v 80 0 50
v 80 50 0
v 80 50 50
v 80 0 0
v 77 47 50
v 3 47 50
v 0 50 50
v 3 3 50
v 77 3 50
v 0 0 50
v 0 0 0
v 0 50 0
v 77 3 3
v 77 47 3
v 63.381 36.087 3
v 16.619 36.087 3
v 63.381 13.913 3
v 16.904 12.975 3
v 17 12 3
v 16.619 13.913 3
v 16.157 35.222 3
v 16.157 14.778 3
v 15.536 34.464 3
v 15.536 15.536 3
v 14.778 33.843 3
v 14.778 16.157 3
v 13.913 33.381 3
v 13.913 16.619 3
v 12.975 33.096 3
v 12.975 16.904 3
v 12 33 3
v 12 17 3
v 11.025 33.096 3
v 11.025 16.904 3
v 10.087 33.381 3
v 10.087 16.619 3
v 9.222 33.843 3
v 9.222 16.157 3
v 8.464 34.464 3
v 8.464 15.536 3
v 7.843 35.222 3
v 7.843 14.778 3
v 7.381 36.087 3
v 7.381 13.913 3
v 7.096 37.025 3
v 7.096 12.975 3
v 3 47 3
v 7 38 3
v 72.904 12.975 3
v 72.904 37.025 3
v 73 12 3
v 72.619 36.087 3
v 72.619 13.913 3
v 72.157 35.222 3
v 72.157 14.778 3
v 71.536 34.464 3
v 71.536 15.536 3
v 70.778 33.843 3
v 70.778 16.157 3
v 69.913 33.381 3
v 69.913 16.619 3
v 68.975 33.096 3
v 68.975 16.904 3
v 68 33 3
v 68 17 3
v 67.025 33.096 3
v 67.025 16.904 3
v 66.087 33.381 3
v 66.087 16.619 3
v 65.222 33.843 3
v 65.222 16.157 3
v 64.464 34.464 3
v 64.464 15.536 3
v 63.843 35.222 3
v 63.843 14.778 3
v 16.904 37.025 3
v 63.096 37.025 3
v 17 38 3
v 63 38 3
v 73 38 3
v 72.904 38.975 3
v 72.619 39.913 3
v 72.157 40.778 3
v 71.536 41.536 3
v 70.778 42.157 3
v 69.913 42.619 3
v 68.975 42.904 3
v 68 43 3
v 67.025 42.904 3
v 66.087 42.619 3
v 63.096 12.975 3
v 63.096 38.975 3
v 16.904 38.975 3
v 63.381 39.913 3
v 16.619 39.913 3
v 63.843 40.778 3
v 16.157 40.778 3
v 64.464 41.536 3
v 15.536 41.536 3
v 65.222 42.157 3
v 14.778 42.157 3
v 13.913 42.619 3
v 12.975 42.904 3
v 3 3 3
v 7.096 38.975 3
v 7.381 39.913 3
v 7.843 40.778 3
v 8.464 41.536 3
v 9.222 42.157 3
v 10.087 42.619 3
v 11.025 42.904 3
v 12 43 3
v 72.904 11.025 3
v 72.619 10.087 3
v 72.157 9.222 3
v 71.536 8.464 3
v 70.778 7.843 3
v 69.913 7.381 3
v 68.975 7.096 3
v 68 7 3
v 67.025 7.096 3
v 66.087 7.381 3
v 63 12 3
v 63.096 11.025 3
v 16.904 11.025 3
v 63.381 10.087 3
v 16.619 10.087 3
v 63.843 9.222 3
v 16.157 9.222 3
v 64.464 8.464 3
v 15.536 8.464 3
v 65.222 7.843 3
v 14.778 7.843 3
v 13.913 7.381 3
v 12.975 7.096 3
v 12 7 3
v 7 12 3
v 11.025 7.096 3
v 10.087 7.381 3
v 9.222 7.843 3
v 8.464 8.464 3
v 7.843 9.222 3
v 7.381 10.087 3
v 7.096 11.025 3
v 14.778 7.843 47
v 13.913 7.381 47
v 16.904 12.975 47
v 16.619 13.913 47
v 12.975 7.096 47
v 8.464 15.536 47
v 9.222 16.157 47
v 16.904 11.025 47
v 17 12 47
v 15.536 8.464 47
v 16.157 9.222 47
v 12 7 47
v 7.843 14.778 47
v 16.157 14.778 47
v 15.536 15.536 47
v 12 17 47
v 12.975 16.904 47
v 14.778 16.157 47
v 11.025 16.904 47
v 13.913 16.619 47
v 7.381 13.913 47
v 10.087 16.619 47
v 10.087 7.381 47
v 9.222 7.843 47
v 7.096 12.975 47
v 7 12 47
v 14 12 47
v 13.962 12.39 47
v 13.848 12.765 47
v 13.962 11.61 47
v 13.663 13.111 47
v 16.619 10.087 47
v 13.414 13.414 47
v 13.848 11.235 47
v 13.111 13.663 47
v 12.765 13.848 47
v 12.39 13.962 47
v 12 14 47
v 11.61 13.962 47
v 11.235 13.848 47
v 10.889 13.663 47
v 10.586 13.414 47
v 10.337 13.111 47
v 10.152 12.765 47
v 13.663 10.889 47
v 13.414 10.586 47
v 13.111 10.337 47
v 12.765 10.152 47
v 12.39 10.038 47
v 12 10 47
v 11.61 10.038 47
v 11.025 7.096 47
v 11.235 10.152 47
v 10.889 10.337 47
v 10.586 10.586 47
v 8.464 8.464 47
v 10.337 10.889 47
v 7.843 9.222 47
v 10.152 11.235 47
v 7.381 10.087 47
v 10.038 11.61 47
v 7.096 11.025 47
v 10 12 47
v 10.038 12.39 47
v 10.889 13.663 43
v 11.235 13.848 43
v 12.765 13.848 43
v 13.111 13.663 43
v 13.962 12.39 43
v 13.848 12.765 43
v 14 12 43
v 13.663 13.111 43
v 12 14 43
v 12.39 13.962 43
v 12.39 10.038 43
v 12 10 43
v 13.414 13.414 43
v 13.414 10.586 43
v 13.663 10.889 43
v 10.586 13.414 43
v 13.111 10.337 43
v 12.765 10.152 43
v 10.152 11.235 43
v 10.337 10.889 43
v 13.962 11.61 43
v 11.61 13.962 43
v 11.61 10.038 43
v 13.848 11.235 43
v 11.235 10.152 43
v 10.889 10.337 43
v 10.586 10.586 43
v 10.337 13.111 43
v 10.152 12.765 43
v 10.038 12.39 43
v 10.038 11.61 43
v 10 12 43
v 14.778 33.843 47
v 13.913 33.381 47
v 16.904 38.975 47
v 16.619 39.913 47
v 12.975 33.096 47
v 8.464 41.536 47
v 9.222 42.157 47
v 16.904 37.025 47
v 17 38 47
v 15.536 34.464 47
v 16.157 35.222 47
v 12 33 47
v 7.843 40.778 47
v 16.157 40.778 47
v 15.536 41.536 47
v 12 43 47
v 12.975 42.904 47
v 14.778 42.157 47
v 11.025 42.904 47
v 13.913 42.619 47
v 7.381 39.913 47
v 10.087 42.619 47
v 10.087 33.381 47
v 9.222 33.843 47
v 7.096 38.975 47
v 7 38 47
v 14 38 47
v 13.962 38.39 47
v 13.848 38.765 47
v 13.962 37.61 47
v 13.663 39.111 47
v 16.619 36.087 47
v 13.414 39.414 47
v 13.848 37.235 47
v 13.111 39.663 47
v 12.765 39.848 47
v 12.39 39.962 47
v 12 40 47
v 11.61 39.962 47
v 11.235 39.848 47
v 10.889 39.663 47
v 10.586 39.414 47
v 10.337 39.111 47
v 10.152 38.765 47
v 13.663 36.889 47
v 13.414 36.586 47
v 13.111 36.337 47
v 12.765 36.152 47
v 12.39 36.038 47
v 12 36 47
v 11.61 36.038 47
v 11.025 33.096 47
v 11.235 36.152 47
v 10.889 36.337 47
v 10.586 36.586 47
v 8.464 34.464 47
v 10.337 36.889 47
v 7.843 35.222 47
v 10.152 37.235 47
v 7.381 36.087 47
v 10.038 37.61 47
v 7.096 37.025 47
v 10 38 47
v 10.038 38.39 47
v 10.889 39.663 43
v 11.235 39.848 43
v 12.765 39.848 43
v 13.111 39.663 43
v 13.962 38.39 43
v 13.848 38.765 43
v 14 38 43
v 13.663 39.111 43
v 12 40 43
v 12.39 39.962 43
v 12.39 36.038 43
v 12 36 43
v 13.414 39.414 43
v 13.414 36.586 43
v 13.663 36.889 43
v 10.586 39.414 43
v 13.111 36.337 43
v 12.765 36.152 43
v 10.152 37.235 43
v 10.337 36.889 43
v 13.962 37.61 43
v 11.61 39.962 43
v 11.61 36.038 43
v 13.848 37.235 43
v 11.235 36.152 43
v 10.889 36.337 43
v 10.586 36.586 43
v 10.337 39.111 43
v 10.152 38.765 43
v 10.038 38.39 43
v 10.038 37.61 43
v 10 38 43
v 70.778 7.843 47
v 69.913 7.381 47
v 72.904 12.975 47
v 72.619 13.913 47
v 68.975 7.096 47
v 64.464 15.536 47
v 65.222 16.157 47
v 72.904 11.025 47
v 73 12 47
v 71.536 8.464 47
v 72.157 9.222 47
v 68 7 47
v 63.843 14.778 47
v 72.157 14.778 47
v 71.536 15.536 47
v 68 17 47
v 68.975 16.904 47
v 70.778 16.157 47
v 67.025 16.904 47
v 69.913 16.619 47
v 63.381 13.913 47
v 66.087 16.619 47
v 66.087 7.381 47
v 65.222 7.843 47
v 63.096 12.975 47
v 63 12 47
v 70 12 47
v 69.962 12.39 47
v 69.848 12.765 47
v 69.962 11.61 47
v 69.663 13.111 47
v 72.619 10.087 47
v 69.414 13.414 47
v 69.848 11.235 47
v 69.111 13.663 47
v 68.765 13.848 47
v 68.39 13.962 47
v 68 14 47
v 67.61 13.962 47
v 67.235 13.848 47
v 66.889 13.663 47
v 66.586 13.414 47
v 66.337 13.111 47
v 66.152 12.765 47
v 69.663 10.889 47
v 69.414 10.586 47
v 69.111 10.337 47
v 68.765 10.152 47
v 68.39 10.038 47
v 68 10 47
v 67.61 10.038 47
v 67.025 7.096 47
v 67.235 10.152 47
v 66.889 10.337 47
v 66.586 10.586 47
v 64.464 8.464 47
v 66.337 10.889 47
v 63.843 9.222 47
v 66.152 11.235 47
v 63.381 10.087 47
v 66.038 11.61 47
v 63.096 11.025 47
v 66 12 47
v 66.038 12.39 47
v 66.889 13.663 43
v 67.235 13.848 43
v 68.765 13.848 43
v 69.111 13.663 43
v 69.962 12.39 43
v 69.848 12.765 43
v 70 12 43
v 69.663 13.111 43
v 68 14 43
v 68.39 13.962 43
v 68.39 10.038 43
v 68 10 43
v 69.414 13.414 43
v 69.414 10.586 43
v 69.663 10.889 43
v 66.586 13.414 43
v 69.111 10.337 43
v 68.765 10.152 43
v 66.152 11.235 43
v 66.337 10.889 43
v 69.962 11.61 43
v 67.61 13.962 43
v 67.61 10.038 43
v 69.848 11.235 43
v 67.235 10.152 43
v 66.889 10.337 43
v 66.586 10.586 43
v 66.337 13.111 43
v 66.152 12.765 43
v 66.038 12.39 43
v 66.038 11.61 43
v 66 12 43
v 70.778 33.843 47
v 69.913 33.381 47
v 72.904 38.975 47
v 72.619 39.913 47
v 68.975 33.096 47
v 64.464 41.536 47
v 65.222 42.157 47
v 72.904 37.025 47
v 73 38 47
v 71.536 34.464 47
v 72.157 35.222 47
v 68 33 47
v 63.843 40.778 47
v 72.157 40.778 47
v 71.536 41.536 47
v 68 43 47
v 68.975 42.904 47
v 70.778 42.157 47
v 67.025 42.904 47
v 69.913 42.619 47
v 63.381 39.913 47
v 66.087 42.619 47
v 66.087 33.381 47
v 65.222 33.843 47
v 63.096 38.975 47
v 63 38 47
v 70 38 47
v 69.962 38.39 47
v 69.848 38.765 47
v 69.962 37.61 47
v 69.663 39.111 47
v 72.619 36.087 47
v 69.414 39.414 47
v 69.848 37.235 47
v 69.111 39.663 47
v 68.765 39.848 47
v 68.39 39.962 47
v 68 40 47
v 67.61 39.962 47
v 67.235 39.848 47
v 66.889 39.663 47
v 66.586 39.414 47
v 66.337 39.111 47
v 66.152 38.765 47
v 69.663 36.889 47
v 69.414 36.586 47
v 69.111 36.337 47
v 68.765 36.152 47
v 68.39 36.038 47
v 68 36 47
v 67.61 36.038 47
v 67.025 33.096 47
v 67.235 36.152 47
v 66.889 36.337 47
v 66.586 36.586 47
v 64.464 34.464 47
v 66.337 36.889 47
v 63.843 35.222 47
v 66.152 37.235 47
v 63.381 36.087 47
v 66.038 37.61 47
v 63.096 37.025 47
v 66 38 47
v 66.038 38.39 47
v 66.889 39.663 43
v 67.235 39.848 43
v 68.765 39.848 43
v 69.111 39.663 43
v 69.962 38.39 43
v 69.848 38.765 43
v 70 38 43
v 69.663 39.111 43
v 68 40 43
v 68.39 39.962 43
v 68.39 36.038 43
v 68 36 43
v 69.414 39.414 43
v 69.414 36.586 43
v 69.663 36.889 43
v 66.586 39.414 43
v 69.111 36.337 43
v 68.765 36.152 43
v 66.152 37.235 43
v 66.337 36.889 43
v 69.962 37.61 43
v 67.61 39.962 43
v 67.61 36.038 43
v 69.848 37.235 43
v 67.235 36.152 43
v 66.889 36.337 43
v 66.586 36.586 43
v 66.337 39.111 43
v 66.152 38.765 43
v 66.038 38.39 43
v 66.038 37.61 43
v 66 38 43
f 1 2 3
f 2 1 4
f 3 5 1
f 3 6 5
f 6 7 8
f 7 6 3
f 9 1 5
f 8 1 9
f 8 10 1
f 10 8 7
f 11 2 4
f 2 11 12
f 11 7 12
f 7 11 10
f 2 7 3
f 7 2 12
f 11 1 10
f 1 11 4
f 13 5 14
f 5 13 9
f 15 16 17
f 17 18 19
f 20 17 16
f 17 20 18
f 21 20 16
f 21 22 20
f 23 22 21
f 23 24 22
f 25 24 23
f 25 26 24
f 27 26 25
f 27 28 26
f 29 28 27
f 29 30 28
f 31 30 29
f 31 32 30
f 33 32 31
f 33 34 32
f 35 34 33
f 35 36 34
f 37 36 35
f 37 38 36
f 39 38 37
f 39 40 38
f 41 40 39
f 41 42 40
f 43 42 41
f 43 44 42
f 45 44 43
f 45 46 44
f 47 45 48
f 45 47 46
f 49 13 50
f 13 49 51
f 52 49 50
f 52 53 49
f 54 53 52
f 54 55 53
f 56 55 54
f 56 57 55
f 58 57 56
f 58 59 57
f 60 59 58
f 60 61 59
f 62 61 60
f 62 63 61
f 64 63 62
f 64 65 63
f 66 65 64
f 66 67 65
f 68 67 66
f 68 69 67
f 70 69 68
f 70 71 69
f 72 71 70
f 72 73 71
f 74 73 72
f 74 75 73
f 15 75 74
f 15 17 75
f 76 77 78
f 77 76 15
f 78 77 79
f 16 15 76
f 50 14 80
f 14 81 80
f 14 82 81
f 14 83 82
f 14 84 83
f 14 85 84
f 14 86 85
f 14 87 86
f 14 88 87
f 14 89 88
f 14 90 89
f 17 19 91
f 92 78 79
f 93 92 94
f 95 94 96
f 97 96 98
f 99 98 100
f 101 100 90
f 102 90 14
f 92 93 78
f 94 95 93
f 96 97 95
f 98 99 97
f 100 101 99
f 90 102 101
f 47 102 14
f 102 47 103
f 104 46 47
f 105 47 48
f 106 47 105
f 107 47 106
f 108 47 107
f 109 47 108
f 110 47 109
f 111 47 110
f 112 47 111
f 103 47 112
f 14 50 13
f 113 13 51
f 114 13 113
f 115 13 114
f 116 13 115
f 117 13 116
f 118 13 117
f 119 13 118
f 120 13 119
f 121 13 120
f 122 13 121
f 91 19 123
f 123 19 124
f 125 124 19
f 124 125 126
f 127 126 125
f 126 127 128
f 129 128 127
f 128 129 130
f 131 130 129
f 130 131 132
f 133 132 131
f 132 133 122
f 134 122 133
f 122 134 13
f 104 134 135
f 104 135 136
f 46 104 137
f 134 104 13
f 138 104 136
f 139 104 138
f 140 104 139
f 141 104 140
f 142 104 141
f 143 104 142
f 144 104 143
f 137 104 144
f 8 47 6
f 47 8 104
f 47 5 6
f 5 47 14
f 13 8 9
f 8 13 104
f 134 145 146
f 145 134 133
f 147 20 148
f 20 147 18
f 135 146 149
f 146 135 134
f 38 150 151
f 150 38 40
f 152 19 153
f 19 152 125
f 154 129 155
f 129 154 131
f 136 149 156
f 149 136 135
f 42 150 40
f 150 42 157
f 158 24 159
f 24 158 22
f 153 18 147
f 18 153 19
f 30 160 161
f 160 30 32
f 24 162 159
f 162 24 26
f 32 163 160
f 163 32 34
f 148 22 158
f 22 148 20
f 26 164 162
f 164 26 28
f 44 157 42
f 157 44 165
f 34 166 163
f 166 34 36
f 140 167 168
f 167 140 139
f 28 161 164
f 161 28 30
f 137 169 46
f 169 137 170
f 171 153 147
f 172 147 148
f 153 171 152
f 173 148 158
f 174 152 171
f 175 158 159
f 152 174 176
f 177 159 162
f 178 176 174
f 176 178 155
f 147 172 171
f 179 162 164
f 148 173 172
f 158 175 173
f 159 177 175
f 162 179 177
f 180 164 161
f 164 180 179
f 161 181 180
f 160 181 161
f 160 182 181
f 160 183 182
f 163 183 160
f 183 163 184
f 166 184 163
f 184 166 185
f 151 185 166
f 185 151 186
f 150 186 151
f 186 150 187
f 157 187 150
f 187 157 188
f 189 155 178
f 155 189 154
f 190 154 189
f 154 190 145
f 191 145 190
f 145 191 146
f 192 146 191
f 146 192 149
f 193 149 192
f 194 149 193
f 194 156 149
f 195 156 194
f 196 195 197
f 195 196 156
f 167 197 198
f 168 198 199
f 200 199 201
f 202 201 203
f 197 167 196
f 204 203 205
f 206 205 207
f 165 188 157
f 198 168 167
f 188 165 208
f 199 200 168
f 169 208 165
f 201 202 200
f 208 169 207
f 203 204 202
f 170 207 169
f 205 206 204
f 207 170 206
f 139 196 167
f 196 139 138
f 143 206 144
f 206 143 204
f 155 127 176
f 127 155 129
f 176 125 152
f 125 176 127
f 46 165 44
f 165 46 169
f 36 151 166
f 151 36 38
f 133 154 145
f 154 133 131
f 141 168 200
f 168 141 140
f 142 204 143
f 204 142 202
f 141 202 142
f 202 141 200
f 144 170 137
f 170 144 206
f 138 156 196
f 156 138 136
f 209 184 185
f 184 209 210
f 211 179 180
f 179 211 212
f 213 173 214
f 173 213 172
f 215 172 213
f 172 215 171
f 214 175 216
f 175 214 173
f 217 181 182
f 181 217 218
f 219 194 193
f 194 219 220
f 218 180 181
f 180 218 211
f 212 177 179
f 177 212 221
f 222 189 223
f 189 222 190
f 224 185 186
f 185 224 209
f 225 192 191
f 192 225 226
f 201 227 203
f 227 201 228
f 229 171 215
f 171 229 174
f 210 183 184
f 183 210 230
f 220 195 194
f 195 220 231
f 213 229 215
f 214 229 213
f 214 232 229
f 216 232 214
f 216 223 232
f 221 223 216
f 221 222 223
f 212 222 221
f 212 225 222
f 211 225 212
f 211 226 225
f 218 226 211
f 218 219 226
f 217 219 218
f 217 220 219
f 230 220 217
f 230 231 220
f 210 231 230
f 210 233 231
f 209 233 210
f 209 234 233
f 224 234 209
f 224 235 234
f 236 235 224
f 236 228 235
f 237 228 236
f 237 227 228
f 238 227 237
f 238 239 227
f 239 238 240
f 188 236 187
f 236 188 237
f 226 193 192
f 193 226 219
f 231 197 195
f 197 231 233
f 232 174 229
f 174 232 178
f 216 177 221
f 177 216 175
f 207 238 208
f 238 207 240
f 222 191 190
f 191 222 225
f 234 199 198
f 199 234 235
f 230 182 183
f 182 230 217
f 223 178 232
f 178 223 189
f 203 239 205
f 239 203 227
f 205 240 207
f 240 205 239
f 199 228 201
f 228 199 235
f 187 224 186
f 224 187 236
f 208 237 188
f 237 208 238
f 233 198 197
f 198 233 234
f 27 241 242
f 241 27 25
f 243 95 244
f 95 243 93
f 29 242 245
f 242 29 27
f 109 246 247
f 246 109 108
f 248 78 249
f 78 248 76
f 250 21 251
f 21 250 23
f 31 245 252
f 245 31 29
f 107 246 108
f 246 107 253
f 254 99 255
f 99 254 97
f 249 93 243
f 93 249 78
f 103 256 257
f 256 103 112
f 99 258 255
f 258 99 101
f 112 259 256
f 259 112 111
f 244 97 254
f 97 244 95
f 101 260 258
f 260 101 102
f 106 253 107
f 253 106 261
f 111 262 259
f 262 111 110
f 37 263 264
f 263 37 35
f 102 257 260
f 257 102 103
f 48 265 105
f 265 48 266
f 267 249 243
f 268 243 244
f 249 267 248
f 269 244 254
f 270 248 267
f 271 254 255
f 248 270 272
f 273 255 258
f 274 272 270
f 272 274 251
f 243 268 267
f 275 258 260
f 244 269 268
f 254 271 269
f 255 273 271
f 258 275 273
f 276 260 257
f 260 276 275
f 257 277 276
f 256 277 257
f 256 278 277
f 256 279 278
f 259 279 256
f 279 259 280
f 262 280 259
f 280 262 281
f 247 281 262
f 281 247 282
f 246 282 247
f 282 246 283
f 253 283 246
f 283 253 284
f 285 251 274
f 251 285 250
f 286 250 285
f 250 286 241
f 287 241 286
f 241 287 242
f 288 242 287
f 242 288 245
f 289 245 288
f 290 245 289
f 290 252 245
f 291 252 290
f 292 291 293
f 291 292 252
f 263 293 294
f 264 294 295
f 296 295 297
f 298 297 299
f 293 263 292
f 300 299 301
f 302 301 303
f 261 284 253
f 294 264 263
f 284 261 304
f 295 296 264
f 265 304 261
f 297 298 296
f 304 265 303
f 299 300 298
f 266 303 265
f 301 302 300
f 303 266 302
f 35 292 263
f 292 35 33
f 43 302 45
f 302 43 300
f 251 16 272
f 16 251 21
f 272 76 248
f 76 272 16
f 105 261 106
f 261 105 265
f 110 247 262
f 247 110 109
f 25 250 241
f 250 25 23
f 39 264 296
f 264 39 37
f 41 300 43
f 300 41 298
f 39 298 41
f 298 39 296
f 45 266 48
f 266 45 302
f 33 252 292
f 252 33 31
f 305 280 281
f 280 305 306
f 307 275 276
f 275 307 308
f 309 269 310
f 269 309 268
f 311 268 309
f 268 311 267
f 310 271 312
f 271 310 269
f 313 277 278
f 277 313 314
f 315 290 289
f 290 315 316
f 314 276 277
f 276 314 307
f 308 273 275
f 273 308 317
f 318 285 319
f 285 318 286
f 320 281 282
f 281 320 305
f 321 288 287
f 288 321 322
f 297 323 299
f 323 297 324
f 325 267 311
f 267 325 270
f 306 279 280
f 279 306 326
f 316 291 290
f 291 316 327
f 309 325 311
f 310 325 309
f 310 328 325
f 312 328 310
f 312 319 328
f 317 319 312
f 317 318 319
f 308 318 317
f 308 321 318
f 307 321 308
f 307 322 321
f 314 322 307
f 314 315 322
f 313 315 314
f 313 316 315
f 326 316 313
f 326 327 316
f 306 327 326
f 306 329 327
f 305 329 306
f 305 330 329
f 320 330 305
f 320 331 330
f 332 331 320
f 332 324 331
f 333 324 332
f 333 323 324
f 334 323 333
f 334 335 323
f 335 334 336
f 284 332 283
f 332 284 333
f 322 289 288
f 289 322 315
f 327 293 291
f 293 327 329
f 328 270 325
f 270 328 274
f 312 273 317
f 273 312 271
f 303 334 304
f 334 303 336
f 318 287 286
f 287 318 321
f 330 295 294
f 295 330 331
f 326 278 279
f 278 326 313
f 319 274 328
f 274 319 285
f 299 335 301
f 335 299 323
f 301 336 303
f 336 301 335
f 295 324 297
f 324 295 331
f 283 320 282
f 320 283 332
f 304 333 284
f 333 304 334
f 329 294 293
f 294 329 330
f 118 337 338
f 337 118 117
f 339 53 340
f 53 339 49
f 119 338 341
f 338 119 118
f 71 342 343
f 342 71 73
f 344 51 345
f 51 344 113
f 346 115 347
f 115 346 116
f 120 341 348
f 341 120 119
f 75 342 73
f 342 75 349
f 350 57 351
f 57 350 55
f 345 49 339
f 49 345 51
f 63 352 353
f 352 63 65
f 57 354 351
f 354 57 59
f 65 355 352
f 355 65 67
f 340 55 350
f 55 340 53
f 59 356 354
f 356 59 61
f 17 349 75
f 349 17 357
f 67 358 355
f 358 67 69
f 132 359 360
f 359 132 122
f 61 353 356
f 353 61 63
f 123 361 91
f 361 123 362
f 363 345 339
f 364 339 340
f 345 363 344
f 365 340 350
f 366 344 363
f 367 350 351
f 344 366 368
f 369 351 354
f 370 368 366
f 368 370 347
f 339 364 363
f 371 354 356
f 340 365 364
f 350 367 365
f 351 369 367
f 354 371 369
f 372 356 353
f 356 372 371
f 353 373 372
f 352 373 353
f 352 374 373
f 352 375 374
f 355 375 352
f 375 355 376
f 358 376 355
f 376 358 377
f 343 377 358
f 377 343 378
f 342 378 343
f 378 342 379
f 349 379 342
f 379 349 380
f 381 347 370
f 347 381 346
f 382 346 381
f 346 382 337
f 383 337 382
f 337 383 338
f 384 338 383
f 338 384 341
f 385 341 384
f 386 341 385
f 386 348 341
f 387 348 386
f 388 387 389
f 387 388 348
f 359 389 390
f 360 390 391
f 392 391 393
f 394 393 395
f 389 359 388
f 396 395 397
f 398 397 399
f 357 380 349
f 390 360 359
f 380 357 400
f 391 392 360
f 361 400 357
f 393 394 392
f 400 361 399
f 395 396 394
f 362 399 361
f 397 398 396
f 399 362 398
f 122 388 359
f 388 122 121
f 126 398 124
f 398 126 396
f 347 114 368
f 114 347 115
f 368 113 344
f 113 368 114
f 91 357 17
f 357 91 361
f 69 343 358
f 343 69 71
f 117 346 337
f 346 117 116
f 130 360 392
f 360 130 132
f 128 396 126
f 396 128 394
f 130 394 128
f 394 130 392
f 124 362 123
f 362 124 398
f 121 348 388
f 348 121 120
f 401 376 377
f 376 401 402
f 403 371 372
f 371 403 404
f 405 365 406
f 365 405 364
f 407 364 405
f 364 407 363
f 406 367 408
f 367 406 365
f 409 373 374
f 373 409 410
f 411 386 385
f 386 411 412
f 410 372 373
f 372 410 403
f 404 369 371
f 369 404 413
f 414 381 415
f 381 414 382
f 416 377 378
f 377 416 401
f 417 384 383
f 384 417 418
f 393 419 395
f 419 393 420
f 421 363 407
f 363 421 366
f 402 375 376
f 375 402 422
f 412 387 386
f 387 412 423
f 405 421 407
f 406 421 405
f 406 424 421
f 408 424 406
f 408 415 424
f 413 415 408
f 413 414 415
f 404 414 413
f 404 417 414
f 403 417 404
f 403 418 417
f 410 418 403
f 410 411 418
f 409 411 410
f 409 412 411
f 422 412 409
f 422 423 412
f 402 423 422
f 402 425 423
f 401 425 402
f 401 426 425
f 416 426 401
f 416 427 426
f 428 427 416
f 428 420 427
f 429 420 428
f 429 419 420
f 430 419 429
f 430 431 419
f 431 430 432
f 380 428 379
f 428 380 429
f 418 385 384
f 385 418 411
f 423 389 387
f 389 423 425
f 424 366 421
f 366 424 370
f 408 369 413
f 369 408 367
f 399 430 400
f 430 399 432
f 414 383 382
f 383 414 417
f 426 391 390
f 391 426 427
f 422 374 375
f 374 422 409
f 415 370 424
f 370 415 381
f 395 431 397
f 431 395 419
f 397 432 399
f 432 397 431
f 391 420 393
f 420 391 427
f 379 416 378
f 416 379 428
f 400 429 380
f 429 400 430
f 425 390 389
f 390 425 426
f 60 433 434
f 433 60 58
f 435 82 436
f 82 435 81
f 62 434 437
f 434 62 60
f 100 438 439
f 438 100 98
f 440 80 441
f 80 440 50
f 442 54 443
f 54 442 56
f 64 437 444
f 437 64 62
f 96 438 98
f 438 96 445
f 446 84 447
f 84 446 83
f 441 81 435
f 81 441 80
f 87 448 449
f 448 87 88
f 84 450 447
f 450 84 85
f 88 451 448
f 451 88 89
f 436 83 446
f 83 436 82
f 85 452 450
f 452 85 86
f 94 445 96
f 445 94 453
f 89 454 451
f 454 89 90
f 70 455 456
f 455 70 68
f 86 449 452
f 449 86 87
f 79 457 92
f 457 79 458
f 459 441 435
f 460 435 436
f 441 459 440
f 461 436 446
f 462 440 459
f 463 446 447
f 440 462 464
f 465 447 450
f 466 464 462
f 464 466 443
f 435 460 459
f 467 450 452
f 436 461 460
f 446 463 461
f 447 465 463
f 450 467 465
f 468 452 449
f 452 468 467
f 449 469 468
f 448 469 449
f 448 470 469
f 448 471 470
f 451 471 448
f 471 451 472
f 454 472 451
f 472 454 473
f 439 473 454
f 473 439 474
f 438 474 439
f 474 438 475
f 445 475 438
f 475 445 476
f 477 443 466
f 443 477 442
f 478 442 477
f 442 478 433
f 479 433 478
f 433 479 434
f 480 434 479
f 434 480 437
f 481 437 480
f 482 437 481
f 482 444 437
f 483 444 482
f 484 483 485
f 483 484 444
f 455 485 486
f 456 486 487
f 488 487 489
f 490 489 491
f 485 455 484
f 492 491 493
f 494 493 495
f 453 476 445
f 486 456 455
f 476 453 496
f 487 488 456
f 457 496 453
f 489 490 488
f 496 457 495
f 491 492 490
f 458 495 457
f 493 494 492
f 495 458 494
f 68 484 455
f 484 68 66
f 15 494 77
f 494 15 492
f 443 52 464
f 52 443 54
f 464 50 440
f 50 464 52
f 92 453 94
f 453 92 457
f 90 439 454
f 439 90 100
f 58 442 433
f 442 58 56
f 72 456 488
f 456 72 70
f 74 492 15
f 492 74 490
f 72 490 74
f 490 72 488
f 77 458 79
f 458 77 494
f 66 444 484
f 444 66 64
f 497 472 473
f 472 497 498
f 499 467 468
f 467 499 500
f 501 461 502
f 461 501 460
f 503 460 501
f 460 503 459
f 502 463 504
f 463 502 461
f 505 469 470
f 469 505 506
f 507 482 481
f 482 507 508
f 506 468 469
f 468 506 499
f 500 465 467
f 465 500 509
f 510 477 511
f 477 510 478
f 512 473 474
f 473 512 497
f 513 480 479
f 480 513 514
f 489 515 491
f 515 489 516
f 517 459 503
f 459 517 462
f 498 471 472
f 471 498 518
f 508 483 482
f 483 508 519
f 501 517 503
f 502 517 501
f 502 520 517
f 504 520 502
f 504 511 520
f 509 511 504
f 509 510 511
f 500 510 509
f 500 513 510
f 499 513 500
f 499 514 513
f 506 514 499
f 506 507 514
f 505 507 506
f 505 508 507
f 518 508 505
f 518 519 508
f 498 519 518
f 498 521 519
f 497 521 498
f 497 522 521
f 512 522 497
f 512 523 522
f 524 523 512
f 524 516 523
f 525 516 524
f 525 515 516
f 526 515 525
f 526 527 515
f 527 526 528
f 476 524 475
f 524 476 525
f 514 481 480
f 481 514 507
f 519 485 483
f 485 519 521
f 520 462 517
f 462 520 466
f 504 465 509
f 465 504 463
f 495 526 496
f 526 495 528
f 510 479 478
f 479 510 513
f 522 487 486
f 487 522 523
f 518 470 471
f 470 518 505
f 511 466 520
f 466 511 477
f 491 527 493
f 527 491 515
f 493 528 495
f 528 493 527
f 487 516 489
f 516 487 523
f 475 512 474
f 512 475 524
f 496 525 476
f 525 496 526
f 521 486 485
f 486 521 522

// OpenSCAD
$fn = 32;

// ----------------------------------------------------------------------
// Enclosure box: bosses enclosure
// ----------------------------------------------------------------------

// --- parameters (mm) ---
box_l = 80;               // outer length, X
box_w = 50;               // outer width, Y
box_h = 50;               // outer height
wall_t = 3;               // wall thickness
boss_r = 5;               // corner boss radius
hole_r = 2;               // boss screw hole radius
boss_in = 12;             // boss inset from the corners

inner_h = box_h - wall_t;  // cavity depth
boss_h = inner_h - 2;  // corner boss height

difference() {
  union() {
    difference() {
      cube([box_l, box_w, box_h]);
      translate([wall_t, wall_t, wall_t])
        cube([box_l - 2 * wall_t, box_w - 2 * wall_t, box_h]);
    }
    for (sx = [0, 1], sy = [0, 1])
      translate([sx ? box_l - boss_in : boss_in,
                 sy ? box_w - boss_in : boss_in, wall_t - 1])
        difference() {
          cylinder(r = boss_r, h = boss_h);
          translate([0, 0, boss_h - 4])
            cylinder(r = hole_r, h = 5);
        }
  }
}
